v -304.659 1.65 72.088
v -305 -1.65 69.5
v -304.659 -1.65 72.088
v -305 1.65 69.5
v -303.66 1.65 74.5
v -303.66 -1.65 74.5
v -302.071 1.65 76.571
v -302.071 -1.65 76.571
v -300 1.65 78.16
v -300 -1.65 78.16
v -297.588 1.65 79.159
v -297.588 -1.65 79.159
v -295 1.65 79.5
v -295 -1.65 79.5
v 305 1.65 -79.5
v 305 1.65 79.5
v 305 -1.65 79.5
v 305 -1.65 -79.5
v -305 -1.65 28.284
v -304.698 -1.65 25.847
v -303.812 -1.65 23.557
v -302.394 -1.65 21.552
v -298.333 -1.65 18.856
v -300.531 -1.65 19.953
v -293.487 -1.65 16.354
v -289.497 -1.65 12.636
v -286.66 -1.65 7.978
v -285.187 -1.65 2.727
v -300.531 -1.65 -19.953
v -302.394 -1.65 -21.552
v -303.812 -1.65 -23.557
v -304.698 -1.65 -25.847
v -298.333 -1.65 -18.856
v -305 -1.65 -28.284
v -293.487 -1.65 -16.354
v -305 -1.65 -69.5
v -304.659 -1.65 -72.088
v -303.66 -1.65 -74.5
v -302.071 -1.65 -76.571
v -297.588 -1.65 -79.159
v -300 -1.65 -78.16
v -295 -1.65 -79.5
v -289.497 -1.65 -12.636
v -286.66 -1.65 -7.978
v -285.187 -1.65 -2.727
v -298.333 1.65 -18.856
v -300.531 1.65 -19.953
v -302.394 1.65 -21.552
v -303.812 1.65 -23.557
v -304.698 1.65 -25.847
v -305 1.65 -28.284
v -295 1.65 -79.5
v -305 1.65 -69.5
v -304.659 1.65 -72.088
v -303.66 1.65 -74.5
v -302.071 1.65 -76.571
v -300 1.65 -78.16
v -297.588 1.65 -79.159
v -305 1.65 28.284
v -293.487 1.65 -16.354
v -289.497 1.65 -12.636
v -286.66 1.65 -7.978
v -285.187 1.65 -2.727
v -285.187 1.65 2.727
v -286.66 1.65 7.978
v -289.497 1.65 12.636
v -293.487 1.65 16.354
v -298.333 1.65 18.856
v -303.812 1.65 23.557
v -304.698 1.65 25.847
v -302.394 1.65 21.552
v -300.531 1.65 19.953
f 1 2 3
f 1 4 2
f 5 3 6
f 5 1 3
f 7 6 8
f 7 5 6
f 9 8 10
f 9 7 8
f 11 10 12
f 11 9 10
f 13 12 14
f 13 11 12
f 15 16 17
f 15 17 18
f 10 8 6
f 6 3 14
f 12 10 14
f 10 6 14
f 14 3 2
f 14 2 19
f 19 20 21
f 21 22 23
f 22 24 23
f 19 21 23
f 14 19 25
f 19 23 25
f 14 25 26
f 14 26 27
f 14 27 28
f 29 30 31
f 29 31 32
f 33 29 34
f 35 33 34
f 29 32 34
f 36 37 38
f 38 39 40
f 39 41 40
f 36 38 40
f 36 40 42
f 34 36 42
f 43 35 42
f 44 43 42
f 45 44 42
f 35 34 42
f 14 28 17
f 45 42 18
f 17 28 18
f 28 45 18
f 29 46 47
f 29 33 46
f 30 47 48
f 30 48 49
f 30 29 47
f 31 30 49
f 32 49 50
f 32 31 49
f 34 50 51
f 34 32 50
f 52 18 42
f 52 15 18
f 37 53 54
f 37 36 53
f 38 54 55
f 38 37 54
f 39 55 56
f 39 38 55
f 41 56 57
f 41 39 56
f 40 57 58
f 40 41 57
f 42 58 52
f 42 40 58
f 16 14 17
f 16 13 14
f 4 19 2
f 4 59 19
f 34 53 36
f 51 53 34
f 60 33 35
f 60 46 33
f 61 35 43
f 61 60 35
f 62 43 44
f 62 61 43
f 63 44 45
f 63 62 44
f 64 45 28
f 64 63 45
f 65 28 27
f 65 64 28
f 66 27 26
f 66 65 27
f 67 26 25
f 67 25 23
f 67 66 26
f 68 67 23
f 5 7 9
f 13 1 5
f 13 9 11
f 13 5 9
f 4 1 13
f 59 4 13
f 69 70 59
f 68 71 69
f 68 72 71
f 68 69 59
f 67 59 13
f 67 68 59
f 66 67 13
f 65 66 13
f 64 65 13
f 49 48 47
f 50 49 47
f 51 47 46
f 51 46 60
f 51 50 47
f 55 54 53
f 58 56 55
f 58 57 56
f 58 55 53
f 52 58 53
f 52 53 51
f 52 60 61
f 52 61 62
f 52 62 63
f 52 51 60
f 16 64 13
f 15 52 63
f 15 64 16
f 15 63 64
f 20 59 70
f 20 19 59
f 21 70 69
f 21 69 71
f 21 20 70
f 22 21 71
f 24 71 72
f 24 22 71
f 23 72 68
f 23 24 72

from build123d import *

# Parameters (mm, degrees)
BOSS_EXTRUDE1_DEPTH = 1.65
FILLET1_R           = 10


with BuildPart() as part:
    # Sketch1 → Boss-Extrude1 (new, symmetric)
    with BuildSketch(Plane(origin=(0, 0, 0), x_dir=(1, 0, 0), z_dir=(0, 1, 0))):
        with BuildLine():
            Line((-305, -20), (-305, -79.5))
            Line((-305, -79.5), (305, -79.5))
            Line((305, -79.5), (305, 79.5))
            Line((305, 79.5), (-305, 79.5))
            Line((-305, 79.5), (-305, 20))
            ThreePointArc((-305, 20), (-285, 0), (-305, -20))
        make_face()
    extrude(amount=BOSS_EXTRUDE1_DEPTH, both=True)

    # Fillet1
    fillet1_edges = [part.edges().sort_by_distance(p)[0] for p in [
        (-305, 0, -79.5),
        (-305, 0, 79.5),
        (-305, 0, 20),
        (-305, 0, -20),
    ]]
    fillet(fillet1_edges, radius=FILLET1_R)


solid = part.part
